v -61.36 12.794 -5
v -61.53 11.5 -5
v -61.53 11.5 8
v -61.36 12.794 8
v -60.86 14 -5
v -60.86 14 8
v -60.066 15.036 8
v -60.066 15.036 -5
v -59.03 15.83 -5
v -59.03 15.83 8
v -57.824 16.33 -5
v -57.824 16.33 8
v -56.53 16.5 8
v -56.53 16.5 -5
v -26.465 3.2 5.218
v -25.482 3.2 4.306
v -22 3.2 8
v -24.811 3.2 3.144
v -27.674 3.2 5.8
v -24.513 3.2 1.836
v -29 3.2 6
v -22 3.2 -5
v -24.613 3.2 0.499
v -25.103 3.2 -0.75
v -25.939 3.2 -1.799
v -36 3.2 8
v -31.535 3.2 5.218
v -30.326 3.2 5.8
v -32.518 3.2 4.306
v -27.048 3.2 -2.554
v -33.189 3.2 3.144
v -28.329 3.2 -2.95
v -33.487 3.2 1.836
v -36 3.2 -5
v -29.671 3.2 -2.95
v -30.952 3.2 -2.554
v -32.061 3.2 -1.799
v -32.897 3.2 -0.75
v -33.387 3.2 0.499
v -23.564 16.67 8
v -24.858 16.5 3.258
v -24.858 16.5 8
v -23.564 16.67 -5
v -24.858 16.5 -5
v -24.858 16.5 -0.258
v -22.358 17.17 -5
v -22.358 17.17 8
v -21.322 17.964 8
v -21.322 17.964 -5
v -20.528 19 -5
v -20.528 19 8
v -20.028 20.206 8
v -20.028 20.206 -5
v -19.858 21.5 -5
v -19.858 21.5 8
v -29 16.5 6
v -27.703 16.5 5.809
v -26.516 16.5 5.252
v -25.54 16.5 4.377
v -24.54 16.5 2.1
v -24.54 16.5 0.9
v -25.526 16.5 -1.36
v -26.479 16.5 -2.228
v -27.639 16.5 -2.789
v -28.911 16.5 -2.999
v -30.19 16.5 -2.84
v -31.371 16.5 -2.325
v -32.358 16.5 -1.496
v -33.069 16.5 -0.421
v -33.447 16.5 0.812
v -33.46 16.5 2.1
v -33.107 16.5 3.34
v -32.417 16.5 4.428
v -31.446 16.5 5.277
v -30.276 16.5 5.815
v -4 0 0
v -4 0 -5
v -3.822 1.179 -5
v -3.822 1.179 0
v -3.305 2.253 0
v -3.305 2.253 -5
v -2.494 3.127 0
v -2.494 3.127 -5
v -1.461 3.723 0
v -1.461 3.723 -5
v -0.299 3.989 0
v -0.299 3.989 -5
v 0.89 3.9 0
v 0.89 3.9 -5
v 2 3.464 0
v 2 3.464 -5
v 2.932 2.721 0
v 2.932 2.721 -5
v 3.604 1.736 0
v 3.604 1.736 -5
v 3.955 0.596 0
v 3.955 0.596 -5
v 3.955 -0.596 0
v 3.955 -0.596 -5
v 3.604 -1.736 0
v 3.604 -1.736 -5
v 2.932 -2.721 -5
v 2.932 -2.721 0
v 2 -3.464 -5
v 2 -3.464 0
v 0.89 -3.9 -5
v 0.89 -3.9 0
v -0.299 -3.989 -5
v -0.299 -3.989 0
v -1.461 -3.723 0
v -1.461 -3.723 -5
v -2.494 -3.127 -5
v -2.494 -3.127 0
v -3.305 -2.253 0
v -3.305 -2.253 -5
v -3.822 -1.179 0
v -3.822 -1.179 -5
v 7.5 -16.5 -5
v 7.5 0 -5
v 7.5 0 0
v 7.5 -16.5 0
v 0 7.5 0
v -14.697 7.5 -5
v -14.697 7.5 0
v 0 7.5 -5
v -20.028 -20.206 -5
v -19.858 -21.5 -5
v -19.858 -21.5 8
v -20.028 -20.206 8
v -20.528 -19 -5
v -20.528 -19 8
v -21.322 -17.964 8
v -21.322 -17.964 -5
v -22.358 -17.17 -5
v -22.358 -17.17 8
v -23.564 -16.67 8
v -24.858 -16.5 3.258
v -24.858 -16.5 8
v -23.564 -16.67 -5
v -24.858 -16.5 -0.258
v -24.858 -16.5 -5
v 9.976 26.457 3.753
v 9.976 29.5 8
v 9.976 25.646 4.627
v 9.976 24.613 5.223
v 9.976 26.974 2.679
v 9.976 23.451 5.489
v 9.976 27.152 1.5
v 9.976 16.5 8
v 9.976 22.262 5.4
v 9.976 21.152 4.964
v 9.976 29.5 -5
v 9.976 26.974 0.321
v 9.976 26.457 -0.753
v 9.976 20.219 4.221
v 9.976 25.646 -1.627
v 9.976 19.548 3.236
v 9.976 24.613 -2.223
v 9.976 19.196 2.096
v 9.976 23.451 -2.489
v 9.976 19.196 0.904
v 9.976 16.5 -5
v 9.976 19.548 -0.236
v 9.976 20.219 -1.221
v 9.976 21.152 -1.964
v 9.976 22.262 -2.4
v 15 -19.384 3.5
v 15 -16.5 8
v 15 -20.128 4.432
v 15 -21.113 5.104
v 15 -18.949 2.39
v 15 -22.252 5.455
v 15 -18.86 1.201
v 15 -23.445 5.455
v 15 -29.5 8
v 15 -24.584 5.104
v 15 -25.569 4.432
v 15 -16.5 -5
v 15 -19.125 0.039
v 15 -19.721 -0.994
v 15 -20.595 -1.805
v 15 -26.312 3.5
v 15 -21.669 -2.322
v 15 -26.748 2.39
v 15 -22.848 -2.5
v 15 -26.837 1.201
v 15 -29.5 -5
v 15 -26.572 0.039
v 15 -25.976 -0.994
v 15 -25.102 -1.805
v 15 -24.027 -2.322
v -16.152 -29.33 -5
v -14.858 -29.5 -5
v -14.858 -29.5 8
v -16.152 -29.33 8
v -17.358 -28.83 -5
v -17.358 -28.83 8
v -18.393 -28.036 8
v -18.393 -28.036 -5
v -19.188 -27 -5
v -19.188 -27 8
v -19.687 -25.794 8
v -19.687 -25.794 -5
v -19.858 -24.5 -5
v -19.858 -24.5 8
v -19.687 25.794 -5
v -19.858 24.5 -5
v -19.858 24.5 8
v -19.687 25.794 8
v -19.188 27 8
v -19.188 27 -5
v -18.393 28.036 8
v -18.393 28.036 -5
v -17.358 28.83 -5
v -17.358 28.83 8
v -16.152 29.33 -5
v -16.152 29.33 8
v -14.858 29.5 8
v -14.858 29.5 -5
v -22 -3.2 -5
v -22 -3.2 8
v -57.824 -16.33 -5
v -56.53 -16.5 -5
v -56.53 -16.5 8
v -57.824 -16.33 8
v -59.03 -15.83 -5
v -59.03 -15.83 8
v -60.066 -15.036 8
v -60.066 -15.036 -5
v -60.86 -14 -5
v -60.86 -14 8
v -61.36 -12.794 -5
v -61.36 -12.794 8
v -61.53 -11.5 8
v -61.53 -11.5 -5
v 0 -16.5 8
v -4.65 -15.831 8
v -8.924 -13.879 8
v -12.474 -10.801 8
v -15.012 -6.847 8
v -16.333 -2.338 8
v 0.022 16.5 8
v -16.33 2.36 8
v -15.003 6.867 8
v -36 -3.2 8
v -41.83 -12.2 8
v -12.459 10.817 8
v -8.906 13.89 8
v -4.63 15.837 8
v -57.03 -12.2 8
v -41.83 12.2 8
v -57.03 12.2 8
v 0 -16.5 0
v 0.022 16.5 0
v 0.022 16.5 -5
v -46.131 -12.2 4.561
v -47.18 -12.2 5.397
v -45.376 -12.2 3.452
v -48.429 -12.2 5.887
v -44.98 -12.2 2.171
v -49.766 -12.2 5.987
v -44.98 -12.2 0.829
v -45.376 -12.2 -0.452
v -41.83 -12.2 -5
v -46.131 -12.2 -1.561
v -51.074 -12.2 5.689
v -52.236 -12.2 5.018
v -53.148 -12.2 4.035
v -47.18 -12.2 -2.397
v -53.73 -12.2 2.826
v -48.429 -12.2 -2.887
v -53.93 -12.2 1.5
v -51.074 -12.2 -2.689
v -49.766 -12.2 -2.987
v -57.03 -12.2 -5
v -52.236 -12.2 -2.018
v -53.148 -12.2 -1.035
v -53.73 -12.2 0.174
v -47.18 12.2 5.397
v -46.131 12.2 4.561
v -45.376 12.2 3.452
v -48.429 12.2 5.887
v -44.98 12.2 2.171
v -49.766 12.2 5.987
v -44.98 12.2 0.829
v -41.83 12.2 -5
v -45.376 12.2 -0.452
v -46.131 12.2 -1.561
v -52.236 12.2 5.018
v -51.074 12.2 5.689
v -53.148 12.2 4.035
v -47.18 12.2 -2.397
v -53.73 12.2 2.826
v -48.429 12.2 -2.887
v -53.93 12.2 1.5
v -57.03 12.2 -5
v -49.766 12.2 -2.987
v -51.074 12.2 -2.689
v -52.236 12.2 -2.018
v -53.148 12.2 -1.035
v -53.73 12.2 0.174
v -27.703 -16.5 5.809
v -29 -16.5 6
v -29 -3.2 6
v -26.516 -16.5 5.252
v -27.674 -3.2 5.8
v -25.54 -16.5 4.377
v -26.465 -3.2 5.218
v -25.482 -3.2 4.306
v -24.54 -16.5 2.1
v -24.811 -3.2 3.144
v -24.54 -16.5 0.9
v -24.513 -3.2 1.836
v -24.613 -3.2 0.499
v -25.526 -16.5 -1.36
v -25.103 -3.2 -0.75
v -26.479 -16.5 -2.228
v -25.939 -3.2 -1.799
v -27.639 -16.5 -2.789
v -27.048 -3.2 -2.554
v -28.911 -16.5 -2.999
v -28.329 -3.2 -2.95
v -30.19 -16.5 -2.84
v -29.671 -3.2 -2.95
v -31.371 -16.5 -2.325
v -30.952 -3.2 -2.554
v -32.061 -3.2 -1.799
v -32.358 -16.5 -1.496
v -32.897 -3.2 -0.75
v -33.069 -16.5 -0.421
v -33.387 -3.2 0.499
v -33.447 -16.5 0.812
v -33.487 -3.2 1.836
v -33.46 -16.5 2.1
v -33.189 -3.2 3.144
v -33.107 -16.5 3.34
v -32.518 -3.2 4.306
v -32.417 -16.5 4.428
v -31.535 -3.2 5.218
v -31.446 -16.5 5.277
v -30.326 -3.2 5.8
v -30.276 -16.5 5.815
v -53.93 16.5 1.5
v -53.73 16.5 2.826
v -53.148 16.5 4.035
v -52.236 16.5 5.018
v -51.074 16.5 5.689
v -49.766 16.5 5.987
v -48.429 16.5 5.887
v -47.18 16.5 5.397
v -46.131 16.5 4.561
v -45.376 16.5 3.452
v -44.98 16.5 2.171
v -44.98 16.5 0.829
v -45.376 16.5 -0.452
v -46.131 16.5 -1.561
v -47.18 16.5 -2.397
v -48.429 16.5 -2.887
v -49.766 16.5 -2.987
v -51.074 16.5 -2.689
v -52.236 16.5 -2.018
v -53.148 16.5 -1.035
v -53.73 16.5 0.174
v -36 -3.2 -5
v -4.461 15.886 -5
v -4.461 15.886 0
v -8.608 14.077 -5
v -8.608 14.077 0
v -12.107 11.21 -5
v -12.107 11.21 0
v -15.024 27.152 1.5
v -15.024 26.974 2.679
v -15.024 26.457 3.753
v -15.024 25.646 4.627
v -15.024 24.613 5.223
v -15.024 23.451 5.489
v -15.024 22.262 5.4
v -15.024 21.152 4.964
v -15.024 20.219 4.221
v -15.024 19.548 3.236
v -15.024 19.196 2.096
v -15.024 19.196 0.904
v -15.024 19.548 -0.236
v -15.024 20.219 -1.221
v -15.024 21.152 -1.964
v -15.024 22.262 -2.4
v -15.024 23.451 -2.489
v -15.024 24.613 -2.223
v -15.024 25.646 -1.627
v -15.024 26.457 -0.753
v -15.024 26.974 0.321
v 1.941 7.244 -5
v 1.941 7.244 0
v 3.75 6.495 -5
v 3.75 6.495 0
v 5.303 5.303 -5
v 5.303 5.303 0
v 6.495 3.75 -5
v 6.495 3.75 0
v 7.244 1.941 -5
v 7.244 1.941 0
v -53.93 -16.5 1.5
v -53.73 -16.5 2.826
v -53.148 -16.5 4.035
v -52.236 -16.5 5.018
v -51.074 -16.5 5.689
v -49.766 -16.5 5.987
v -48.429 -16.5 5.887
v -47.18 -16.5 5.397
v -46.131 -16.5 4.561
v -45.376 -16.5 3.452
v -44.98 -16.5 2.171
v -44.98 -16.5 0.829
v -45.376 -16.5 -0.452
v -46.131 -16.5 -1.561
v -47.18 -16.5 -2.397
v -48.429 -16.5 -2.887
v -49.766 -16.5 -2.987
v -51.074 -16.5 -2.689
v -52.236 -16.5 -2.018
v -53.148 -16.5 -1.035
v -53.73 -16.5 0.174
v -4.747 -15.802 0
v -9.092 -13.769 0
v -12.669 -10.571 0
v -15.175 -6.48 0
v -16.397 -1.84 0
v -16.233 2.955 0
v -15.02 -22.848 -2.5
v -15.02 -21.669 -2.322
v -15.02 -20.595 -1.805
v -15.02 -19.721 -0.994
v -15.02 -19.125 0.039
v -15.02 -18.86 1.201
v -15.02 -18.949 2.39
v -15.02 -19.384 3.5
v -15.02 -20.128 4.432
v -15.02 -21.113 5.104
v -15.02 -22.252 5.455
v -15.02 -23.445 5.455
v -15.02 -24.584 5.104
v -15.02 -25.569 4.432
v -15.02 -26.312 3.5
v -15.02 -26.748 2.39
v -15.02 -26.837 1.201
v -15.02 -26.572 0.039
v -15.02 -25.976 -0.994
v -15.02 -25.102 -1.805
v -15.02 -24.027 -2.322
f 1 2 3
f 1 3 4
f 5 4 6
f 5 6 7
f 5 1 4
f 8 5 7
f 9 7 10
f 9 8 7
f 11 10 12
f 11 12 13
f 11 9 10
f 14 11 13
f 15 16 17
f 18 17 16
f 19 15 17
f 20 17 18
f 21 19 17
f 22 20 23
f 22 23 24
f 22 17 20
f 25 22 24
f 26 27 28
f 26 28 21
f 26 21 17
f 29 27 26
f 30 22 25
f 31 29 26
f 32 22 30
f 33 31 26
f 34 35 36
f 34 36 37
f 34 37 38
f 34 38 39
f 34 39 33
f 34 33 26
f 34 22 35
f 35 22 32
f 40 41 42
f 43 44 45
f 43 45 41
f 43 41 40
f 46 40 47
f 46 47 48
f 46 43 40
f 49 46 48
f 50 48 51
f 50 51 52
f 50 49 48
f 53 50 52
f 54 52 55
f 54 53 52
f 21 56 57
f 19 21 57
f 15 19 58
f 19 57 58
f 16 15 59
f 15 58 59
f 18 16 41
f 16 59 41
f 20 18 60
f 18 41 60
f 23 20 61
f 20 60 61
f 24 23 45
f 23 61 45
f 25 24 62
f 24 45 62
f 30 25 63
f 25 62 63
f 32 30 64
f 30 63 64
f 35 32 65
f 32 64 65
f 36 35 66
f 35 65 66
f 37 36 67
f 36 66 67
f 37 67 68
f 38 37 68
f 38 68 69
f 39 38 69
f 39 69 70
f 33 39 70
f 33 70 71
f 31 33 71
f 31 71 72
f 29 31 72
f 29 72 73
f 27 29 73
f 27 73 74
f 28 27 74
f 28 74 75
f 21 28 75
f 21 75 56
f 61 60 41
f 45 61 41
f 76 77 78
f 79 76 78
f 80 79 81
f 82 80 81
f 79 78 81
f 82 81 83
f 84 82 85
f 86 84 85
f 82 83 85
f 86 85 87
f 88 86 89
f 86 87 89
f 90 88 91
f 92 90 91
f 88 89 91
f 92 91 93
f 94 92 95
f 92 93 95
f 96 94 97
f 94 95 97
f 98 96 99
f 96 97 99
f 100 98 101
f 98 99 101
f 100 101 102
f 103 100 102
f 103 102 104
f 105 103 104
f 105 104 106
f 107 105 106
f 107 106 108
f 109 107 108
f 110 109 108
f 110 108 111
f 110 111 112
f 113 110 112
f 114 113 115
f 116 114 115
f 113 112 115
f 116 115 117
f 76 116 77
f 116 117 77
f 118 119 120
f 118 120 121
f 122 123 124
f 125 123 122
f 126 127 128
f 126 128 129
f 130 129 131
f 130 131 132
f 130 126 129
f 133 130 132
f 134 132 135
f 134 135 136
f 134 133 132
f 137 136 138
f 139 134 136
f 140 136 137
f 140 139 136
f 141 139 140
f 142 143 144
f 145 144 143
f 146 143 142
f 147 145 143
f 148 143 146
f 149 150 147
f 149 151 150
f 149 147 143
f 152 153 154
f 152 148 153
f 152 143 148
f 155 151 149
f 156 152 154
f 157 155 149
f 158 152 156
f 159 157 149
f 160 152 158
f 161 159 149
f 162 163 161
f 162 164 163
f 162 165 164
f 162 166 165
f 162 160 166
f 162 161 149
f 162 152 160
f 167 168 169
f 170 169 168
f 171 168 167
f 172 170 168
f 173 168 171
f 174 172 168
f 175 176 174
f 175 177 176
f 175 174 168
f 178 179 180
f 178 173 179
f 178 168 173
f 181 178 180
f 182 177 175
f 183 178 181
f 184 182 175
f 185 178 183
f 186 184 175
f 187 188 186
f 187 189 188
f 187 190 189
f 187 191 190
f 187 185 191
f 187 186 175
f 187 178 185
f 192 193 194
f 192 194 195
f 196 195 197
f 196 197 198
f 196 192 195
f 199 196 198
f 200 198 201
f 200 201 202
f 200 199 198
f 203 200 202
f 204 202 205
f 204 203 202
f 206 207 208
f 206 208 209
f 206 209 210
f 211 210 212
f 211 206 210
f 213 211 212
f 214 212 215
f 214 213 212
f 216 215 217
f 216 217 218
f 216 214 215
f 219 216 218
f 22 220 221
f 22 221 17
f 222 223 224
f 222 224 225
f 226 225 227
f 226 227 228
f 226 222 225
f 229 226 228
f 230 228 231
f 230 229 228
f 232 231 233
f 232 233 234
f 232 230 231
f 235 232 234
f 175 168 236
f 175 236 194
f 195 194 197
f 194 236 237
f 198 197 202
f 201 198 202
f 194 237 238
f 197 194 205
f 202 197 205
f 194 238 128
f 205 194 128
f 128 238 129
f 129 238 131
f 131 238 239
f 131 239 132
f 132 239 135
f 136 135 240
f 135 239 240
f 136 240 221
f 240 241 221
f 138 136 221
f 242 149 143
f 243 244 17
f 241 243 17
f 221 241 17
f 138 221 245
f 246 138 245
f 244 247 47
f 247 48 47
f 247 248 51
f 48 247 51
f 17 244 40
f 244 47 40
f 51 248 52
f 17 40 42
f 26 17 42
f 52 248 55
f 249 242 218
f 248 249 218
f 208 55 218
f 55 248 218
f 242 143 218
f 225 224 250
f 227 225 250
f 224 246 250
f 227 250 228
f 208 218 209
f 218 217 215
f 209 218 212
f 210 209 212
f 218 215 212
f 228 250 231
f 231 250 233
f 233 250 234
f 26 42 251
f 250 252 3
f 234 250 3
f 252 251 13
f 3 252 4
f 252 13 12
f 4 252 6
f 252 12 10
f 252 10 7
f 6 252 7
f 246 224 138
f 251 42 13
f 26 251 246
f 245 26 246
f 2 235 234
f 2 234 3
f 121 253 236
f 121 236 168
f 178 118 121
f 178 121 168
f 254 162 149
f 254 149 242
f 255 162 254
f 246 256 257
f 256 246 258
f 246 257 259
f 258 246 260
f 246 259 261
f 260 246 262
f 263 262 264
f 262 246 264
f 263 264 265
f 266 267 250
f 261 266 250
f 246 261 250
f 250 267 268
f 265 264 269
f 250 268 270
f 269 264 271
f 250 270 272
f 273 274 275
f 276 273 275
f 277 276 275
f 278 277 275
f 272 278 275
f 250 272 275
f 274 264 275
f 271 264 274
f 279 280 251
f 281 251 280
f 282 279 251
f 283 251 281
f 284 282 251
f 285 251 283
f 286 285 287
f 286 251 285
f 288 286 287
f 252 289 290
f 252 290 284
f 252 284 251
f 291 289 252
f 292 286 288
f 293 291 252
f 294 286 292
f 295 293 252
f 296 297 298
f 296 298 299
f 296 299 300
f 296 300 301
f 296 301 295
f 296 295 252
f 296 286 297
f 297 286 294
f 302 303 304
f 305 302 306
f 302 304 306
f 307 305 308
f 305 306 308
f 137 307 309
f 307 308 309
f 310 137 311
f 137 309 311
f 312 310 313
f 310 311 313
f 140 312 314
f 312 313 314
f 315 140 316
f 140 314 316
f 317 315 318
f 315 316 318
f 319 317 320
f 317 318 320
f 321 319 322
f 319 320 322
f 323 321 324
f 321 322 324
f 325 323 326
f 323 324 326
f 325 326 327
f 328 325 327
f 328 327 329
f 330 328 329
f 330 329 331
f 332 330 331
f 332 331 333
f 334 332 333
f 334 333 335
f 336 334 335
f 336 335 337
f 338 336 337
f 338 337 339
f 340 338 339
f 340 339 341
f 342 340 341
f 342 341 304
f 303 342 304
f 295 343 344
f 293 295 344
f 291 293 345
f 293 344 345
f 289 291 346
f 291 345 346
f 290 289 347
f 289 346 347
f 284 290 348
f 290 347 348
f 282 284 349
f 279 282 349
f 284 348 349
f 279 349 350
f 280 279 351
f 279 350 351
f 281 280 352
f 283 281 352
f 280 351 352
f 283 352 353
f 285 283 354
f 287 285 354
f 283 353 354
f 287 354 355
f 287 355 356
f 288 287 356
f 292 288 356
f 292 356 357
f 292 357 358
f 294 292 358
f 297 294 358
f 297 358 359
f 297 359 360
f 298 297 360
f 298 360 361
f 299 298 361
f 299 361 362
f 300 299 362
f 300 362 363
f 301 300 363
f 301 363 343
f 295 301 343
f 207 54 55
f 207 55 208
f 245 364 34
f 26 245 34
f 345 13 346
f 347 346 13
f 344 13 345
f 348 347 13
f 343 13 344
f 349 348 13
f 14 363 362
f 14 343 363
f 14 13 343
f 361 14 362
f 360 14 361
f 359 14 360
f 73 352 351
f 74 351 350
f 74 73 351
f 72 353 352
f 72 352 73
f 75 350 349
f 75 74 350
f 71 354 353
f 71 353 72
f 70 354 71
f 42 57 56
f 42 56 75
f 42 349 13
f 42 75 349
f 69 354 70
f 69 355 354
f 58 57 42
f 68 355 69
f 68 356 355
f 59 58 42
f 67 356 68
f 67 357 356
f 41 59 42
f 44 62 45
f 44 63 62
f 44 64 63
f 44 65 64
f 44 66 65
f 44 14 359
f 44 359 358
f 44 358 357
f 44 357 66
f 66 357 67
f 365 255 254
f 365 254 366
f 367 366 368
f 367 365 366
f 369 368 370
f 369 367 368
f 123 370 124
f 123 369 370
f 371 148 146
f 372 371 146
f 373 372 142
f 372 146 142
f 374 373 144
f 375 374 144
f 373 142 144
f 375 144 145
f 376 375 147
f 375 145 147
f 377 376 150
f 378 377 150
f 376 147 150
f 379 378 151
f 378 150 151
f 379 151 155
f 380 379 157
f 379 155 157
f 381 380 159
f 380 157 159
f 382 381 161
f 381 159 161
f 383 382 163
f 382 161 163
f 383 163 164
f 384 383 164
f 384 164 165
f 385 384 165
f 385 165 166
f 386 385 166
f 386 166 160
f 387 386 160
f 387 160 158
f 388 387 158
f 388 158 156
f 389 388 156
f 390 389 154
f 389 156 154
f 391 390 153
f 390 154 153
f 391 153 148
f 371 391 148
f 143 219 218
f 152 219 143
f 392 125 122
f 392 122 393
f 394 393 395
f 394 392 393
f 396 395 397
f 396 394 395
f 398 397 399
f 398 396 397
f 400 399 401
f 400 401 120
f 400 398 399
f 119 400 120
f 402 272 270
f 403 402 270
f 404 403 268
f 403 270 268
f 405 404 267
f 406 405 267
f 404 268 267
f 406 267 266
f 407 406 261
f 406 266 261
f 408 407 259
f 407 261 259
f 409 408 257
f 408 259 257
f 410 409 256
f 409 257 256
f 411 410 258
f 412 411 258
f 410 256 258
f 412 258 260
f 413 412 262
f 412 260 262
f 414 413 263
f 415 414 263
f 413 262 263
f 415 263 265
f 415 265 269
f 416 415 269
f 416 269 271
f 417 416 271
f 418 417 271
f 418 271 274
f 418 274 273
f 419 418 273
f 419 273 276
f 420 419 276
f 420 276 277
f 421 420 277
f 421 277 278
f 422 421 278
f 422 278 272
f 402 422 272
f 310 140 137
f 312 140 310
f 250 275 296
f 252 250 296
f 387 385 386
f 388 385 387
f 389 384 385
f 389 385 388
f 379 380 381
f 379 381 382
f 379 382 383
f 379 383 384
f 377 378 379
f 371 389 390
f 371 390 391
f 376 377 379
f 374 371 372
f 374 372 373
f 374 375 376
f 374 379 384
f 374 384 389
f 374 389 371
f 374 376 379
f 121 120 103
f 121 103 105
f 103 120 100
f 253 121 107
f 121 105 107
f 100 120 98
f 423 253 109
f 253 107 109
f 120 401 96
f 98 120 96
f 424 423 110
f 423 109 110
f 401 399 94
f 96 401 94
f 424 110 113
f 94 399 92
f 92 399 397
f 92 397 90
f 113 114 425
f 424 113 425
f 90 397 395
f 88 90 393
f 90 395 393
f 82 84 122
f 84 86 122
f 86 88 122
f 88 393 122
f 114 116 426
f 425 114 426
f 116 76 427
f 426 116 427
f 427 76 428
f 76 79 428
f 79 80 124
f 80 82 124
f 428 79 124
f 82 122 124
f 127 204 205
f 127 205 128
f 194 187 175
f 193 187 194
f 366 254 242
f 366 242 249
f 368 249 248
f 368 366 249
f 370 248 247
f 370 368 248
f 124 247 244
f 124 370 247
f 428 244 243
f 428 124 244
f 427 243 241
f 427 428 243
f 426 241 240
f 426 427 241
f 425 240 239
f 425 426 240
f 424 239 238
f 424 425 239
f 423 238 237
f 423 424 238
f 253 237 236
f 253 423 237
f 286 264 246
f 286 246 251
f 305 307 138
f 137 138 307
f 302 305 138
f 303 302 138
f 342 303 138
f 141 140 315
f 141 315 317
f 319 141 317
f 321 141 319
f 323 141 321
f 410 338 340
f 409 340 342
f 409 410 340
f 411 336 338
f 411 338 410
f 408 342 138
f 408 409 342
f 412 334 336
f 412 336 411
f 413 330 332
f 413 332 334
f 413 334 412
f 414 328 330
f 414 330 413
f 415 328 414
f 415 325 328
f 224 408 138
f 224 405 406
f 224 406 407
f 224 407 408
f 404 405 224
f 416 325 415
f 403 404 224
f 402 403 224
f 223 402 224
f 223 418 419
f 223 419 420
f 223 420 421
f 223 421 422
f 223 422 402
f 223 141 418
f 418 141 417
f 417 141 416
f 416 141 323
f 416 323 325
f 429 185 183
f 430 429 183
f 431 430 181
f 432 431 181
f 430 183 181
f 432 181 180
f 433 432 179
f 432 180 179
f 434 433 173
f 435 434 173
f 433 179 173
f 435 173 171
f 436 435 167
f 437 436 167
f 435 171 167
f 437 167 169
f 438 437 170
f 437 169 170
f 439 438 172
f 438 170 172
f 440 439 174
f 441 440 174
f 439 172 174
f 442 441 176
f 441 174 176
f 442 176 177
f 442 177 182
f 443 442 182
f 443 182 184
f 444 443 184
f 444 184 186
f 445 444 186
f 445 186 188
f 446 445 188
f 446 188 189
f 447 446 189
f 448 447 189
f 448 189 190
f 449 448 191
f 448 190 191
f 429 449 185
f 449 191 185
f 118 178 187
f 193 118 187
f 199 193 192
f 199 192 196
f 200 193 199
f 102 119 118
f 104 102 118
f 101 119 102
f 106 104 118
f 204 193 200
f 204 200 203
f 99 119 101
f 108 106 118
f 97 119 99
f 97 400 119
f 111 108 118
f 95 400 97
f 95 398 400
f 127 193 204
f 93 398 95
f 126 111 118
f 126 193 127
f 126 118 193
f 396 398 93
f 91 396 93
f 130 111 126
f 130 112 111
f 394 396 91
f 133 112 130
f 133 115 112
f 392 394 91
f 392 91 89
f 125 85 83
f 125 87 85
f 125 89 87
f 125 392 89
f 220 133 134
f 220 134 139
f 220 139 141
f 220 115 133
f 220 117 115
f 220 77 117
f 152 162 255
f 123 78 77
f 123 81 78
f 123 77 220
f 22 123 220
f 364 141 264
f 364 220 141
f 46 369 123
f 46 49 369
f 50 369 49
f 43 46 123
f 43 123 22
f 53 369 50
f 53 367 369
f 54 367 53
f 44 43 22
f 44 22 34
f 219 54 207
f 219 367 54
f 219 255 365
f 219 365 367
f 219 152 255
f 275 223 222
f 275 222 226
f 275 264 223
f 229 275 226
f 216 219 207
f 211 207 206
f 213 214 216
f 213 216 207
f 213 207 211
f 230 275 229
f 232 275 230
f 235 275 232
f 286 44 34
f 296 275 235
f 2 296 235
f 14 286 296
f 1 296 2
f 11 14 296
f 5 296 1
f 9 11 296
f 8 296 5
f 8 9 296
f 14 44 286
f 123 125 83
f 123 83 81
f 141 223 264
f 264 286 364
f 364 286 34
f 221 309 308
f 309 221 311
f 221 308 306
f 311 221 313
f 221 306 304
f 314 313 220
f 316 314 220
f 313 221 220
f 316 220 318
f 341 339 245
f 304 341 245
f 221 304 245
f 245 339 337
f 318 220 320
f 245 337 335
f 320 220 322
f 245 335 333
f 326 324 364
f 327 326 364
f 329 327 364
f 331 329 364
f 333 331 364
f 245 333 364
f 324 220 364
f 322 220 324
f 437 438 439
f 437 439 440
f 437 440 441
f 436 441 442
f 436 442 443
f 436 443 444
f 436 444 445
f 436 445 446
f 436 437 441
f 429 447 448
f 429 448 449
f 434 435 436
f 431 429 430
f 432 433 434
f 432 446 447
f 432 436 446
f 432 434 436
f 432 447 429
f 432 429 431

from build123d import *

# Parameters (mm, degrees)
CROQUIS1_W              = 15.2
CROQUIS1_H              = 24.4
CROQUIS1_W_2            = 14
CROQUIS1_H_2            = 6.4
SALIENTE_EXTRUIR2_DEPTH = 8
SALIENTE_EXTRUIR4_START = 5
CROQUIS2_W              = 14
CROQUIS2_H              = 6.4
CROQUIS2_W_2            = 15.2
CROQUIS2_H_2            = 24.4
CROQUIS2_R              = 4
SALIENTE_EXTRUIR4_DEPTH = 5
CROQUIS3_R              = 4
CORTAR_EXTRUIR1_DEPTH   = 25
CROQUIS4_R              = 4
CORTAR_EXTRUIR2_DEPTH   = 30.02
CORTAR_EXTRUIR3_REACH   = 79.24
CROQUIS5_R              = 4.5


with BuildPart() as part:
    # Croquis1 → Saliente-Extruir2 (new body)
    with BuildSketch(Plane.XY):
        with BuildLine():
            Line((9.976185601, 29.499985584), (9.976185601, 16.499985584))
            Line((9.976185601, 16.499985584), (0.021811005, 16.499985584))
            ThreePointArc((0.021811005, 16.499985584), (-16.499996396, 0.010905505), (0, -16.5))
            Line((0, -16.5), (15, -16.5))
            Line((15, -16.5), (15, -29.5))
            Line((15, -29.5), (-14.857693224, -29.5))
            ThreePointArc((-14.857693224, -29.5), (-18.39322713, -28.035533906), (-19.857693224, -24.5))
            Line((-19.857693224, -24.5), (-19.857693224, -21.5))
            ThreePointArc((-19.857693224, -21.5), (-21.322159318, -17.964466094), (-24.857693224, -16.5))
            Line((-24.857693224, -16.5), (-56.53, -16.5))
            ThreePointArc((-56.53, -16.5), (-60.065533906, -15.035533906), (-61.53, -11.5))
            Line((-61.53, -11.5), (-61.53, 11.5))
            ThreePointArc((-61.53, 11.5), (-60.065533906, 15.035533906), (-56.53, 16.5))
            Line((-56.53, 16.5), (-24.857693224, 16.5))
            ThreePointArc((-24.857693224, 16.5), (-21.322159318, 17.964466094), (-19.857693224, 21.5))
            Line((-19.857693224, 21.5), (-19.857693224, 24.499985584))
            ThreePointArc((-19.857693224, 24.499985584), (-18.39322713, 28.03551949), (-14.857693224, 29.499985584))
            Line((-14.857693224, 29.499985584), (9.976185601, 29.499985584))
        make_face()
        with Locations((-49.43, 0)):
            Rectangle(CROQUIS1_W, CROQUIS1_H, mode=Mode.SUBTRACT)
        with Locations((-29, 0)):
            Rectangle(CROQUIS1_W_2, CROQUIS1_H_2, mode=Mode.SUBTRACT)
    extrude(amount=SALIENTE_EXTRUIR2_DEPTH)

    # Croquis2 → Saliente-Extruir4 (add)
    with BuildSketch(Plane(origin=(0, 0, 0), x_dir=(-1, 0, 0), z_dir=(0, 0, -1)).offset(SALIENTE_EXTRUIR4_START)):
        with BuildLine():
            Line((56.53, 16.5), (24.857693224, 16.5))
            ThreePointArc((24.857693224, 16.5), (21.322159318, 17.964466094), (19.857693224, 21.5))
            Line((19.857693224, 21.5), (19.857693224, 24.499985584))
            ThreePointArc((19.857693224, 24.499985584), (18.39322713, 28.03551949), (14.857693224, 29.499985584))
            Line((14.857693224, 29.499985584), (-9.976185601, 29.499985584))
            Line((-9.976185601, 29.499985584), (-9.976185601, 16.499985584))
            Line((-9.976185601, 16.499985584), (-0.021811005, 16.499985584))
            ThreePointArc((-0.021811005, 16.499985584), (8.607541842, 14.07693942), (14.696938457, 7.5))
            Line((14.696938457, 7.5), (0, 7.5))
            ThreePointArc((0, 7.5), (-5.303300859, 5.303300859), (-7.5, 0))
            Line((-7.5, 0), (-7.5, -16.5))
            Line((-7.5, -16.5), (-15, -16.5))
            Line((-15, -16.5), (-15, -29.5))
            Line((-15, -29.5), (14.857693224, -29.5))
            ThreePointArc((14.857693224, -29.5), (18.39322713, -28.035533906), (19.857693224, -24.5))
            Line((19.857693224, -24.5), (19.857693224, -21.5))
            ThreePointArc((19.857693224, -21.5), (21.322159318, -17.964466094), (24.857693224, -16.5))
            Line((24.857693224, -16.5), (56.53, -16.5))
            ThreePointArc((56.53, -16.5), (60.065533906, -15.035533906), (61.53, -11.5))
            Line((61.53, -11.5), (61.53, 11.5))
            ThreePointArc((61.53, 11.5), (60.065533906, 15.035533906), (56.53, 16.5))
        make_face()
        with Locations((29, 0)):
            Rectangle(CROQUIS2_W, CROQUIS2_H, mode=Mode.SUBTRACT)
        with Locations((49.43, 0)):
            Rectangle(CROQUIS2_W_2, CROQUIS2_H_2, mode=Mode.SUBTRACT)
        Circle(CROQUIS2_R, mode=Mode.SUBTRACT)
    extrude(amount=-SALIENTE_EXTRUIR4_DEPTH)

    # Croquis3 → Cortar-Extruir1 (cut)
    with BuildSketch(Plane(origin=(9.976185601, 0, 0), x_dir=(0, 0, -1), z_dir=(1, 0, 0))):
        with Locations(Location((-1.5, 23.151636707, 0), (0, 0, 90))):
            Circle(CROQUIS3_R)
    extrude(amount=-CORTAR_EXTRUIR1_DEPTH, mode=Mode.SUBTRACT)

    # Croquis4 → Cortar-Extruir2 (cut)
    with BuildSketch(Plane(origin=(15, 0, 0), x_dir=(0, 0, -1), z_dir=(1, 0, 0))):
        with Locations((-1.5, -22.848348878)):
            Circle(CROQUIS4_R)
    extrude(amount=-CORTAR_EXTRUIR2_DEPTH, mode=Mode.SUBTRACT)

    # Cortar-Extruir3: up to this face of the body (flat: up to its plane)
    cortar_extruir3_end = Plane(part.part.faces().sort_by_distance((-40.693846612, -16.5, 1.5))[0])
    # Croquis5 → Cortar-Extruir3 (cut, up to the picked face)
    with BuildSketch(Plane(origin=(0, 16.5, 0), x_dir=(1, 0, 0), z_dir=(0, 1, 0)), mode=Mode.PRIVATE) as cortar_extruir3_sk1:
        with Locations(Location((-49.43, -1.5, 0), (0, 0, 180))):
            Circle(CROQUIS5_R)
    cortar_extruir3_tool1 = split(extrude(cortar_extruir3_sk1.sketch, amount=-CORTAR_EXTRUIR3_REACH, mode=Mode.PRIVATE), bisect_by=cortar_extruir3_end, keep=Keep.BOTH, mode=Mode.PRIVATE)
    # Croquis5 → Cortar-Extruir3 (cut, up to the picked face)
    with BuildSketch(Plane(origin=(0, 16.5, 0), x_dir=(1, 0, 0), z_dir=(0, 1, 0)), mode=Mode.PRIVATE) as cortar_extruir3_sk2:
        with Locations(Location((-29, -1.5, 0), (0, 0, 270))):
            Circle(CROQUIS5_R)
    cortar_extruir3_tool2 = split(extrude(cortar_extruir3_sk2.sketch, amount=-CORTAR_EXTRUIR3_REACH, mode=Mode.PRIVATE), bisect_by=cortar_extruir3_end, keep=Keep.BOTH, mode=Mode.PRIVATE)
    add(cortar_extruir3_tool1.solids().sort_by(Axis((-49.43, 16.5, 1.5), (0, -1, 0)))[0], mode=Mode.SUBTRACT)
    add(cortar_extruir3_tool2.solids().sort_by(Axis((-29, 16.5, 1.5), (0, -1, 0)))[0], mode=Mode.SUBTRACT)


solid = part.part
